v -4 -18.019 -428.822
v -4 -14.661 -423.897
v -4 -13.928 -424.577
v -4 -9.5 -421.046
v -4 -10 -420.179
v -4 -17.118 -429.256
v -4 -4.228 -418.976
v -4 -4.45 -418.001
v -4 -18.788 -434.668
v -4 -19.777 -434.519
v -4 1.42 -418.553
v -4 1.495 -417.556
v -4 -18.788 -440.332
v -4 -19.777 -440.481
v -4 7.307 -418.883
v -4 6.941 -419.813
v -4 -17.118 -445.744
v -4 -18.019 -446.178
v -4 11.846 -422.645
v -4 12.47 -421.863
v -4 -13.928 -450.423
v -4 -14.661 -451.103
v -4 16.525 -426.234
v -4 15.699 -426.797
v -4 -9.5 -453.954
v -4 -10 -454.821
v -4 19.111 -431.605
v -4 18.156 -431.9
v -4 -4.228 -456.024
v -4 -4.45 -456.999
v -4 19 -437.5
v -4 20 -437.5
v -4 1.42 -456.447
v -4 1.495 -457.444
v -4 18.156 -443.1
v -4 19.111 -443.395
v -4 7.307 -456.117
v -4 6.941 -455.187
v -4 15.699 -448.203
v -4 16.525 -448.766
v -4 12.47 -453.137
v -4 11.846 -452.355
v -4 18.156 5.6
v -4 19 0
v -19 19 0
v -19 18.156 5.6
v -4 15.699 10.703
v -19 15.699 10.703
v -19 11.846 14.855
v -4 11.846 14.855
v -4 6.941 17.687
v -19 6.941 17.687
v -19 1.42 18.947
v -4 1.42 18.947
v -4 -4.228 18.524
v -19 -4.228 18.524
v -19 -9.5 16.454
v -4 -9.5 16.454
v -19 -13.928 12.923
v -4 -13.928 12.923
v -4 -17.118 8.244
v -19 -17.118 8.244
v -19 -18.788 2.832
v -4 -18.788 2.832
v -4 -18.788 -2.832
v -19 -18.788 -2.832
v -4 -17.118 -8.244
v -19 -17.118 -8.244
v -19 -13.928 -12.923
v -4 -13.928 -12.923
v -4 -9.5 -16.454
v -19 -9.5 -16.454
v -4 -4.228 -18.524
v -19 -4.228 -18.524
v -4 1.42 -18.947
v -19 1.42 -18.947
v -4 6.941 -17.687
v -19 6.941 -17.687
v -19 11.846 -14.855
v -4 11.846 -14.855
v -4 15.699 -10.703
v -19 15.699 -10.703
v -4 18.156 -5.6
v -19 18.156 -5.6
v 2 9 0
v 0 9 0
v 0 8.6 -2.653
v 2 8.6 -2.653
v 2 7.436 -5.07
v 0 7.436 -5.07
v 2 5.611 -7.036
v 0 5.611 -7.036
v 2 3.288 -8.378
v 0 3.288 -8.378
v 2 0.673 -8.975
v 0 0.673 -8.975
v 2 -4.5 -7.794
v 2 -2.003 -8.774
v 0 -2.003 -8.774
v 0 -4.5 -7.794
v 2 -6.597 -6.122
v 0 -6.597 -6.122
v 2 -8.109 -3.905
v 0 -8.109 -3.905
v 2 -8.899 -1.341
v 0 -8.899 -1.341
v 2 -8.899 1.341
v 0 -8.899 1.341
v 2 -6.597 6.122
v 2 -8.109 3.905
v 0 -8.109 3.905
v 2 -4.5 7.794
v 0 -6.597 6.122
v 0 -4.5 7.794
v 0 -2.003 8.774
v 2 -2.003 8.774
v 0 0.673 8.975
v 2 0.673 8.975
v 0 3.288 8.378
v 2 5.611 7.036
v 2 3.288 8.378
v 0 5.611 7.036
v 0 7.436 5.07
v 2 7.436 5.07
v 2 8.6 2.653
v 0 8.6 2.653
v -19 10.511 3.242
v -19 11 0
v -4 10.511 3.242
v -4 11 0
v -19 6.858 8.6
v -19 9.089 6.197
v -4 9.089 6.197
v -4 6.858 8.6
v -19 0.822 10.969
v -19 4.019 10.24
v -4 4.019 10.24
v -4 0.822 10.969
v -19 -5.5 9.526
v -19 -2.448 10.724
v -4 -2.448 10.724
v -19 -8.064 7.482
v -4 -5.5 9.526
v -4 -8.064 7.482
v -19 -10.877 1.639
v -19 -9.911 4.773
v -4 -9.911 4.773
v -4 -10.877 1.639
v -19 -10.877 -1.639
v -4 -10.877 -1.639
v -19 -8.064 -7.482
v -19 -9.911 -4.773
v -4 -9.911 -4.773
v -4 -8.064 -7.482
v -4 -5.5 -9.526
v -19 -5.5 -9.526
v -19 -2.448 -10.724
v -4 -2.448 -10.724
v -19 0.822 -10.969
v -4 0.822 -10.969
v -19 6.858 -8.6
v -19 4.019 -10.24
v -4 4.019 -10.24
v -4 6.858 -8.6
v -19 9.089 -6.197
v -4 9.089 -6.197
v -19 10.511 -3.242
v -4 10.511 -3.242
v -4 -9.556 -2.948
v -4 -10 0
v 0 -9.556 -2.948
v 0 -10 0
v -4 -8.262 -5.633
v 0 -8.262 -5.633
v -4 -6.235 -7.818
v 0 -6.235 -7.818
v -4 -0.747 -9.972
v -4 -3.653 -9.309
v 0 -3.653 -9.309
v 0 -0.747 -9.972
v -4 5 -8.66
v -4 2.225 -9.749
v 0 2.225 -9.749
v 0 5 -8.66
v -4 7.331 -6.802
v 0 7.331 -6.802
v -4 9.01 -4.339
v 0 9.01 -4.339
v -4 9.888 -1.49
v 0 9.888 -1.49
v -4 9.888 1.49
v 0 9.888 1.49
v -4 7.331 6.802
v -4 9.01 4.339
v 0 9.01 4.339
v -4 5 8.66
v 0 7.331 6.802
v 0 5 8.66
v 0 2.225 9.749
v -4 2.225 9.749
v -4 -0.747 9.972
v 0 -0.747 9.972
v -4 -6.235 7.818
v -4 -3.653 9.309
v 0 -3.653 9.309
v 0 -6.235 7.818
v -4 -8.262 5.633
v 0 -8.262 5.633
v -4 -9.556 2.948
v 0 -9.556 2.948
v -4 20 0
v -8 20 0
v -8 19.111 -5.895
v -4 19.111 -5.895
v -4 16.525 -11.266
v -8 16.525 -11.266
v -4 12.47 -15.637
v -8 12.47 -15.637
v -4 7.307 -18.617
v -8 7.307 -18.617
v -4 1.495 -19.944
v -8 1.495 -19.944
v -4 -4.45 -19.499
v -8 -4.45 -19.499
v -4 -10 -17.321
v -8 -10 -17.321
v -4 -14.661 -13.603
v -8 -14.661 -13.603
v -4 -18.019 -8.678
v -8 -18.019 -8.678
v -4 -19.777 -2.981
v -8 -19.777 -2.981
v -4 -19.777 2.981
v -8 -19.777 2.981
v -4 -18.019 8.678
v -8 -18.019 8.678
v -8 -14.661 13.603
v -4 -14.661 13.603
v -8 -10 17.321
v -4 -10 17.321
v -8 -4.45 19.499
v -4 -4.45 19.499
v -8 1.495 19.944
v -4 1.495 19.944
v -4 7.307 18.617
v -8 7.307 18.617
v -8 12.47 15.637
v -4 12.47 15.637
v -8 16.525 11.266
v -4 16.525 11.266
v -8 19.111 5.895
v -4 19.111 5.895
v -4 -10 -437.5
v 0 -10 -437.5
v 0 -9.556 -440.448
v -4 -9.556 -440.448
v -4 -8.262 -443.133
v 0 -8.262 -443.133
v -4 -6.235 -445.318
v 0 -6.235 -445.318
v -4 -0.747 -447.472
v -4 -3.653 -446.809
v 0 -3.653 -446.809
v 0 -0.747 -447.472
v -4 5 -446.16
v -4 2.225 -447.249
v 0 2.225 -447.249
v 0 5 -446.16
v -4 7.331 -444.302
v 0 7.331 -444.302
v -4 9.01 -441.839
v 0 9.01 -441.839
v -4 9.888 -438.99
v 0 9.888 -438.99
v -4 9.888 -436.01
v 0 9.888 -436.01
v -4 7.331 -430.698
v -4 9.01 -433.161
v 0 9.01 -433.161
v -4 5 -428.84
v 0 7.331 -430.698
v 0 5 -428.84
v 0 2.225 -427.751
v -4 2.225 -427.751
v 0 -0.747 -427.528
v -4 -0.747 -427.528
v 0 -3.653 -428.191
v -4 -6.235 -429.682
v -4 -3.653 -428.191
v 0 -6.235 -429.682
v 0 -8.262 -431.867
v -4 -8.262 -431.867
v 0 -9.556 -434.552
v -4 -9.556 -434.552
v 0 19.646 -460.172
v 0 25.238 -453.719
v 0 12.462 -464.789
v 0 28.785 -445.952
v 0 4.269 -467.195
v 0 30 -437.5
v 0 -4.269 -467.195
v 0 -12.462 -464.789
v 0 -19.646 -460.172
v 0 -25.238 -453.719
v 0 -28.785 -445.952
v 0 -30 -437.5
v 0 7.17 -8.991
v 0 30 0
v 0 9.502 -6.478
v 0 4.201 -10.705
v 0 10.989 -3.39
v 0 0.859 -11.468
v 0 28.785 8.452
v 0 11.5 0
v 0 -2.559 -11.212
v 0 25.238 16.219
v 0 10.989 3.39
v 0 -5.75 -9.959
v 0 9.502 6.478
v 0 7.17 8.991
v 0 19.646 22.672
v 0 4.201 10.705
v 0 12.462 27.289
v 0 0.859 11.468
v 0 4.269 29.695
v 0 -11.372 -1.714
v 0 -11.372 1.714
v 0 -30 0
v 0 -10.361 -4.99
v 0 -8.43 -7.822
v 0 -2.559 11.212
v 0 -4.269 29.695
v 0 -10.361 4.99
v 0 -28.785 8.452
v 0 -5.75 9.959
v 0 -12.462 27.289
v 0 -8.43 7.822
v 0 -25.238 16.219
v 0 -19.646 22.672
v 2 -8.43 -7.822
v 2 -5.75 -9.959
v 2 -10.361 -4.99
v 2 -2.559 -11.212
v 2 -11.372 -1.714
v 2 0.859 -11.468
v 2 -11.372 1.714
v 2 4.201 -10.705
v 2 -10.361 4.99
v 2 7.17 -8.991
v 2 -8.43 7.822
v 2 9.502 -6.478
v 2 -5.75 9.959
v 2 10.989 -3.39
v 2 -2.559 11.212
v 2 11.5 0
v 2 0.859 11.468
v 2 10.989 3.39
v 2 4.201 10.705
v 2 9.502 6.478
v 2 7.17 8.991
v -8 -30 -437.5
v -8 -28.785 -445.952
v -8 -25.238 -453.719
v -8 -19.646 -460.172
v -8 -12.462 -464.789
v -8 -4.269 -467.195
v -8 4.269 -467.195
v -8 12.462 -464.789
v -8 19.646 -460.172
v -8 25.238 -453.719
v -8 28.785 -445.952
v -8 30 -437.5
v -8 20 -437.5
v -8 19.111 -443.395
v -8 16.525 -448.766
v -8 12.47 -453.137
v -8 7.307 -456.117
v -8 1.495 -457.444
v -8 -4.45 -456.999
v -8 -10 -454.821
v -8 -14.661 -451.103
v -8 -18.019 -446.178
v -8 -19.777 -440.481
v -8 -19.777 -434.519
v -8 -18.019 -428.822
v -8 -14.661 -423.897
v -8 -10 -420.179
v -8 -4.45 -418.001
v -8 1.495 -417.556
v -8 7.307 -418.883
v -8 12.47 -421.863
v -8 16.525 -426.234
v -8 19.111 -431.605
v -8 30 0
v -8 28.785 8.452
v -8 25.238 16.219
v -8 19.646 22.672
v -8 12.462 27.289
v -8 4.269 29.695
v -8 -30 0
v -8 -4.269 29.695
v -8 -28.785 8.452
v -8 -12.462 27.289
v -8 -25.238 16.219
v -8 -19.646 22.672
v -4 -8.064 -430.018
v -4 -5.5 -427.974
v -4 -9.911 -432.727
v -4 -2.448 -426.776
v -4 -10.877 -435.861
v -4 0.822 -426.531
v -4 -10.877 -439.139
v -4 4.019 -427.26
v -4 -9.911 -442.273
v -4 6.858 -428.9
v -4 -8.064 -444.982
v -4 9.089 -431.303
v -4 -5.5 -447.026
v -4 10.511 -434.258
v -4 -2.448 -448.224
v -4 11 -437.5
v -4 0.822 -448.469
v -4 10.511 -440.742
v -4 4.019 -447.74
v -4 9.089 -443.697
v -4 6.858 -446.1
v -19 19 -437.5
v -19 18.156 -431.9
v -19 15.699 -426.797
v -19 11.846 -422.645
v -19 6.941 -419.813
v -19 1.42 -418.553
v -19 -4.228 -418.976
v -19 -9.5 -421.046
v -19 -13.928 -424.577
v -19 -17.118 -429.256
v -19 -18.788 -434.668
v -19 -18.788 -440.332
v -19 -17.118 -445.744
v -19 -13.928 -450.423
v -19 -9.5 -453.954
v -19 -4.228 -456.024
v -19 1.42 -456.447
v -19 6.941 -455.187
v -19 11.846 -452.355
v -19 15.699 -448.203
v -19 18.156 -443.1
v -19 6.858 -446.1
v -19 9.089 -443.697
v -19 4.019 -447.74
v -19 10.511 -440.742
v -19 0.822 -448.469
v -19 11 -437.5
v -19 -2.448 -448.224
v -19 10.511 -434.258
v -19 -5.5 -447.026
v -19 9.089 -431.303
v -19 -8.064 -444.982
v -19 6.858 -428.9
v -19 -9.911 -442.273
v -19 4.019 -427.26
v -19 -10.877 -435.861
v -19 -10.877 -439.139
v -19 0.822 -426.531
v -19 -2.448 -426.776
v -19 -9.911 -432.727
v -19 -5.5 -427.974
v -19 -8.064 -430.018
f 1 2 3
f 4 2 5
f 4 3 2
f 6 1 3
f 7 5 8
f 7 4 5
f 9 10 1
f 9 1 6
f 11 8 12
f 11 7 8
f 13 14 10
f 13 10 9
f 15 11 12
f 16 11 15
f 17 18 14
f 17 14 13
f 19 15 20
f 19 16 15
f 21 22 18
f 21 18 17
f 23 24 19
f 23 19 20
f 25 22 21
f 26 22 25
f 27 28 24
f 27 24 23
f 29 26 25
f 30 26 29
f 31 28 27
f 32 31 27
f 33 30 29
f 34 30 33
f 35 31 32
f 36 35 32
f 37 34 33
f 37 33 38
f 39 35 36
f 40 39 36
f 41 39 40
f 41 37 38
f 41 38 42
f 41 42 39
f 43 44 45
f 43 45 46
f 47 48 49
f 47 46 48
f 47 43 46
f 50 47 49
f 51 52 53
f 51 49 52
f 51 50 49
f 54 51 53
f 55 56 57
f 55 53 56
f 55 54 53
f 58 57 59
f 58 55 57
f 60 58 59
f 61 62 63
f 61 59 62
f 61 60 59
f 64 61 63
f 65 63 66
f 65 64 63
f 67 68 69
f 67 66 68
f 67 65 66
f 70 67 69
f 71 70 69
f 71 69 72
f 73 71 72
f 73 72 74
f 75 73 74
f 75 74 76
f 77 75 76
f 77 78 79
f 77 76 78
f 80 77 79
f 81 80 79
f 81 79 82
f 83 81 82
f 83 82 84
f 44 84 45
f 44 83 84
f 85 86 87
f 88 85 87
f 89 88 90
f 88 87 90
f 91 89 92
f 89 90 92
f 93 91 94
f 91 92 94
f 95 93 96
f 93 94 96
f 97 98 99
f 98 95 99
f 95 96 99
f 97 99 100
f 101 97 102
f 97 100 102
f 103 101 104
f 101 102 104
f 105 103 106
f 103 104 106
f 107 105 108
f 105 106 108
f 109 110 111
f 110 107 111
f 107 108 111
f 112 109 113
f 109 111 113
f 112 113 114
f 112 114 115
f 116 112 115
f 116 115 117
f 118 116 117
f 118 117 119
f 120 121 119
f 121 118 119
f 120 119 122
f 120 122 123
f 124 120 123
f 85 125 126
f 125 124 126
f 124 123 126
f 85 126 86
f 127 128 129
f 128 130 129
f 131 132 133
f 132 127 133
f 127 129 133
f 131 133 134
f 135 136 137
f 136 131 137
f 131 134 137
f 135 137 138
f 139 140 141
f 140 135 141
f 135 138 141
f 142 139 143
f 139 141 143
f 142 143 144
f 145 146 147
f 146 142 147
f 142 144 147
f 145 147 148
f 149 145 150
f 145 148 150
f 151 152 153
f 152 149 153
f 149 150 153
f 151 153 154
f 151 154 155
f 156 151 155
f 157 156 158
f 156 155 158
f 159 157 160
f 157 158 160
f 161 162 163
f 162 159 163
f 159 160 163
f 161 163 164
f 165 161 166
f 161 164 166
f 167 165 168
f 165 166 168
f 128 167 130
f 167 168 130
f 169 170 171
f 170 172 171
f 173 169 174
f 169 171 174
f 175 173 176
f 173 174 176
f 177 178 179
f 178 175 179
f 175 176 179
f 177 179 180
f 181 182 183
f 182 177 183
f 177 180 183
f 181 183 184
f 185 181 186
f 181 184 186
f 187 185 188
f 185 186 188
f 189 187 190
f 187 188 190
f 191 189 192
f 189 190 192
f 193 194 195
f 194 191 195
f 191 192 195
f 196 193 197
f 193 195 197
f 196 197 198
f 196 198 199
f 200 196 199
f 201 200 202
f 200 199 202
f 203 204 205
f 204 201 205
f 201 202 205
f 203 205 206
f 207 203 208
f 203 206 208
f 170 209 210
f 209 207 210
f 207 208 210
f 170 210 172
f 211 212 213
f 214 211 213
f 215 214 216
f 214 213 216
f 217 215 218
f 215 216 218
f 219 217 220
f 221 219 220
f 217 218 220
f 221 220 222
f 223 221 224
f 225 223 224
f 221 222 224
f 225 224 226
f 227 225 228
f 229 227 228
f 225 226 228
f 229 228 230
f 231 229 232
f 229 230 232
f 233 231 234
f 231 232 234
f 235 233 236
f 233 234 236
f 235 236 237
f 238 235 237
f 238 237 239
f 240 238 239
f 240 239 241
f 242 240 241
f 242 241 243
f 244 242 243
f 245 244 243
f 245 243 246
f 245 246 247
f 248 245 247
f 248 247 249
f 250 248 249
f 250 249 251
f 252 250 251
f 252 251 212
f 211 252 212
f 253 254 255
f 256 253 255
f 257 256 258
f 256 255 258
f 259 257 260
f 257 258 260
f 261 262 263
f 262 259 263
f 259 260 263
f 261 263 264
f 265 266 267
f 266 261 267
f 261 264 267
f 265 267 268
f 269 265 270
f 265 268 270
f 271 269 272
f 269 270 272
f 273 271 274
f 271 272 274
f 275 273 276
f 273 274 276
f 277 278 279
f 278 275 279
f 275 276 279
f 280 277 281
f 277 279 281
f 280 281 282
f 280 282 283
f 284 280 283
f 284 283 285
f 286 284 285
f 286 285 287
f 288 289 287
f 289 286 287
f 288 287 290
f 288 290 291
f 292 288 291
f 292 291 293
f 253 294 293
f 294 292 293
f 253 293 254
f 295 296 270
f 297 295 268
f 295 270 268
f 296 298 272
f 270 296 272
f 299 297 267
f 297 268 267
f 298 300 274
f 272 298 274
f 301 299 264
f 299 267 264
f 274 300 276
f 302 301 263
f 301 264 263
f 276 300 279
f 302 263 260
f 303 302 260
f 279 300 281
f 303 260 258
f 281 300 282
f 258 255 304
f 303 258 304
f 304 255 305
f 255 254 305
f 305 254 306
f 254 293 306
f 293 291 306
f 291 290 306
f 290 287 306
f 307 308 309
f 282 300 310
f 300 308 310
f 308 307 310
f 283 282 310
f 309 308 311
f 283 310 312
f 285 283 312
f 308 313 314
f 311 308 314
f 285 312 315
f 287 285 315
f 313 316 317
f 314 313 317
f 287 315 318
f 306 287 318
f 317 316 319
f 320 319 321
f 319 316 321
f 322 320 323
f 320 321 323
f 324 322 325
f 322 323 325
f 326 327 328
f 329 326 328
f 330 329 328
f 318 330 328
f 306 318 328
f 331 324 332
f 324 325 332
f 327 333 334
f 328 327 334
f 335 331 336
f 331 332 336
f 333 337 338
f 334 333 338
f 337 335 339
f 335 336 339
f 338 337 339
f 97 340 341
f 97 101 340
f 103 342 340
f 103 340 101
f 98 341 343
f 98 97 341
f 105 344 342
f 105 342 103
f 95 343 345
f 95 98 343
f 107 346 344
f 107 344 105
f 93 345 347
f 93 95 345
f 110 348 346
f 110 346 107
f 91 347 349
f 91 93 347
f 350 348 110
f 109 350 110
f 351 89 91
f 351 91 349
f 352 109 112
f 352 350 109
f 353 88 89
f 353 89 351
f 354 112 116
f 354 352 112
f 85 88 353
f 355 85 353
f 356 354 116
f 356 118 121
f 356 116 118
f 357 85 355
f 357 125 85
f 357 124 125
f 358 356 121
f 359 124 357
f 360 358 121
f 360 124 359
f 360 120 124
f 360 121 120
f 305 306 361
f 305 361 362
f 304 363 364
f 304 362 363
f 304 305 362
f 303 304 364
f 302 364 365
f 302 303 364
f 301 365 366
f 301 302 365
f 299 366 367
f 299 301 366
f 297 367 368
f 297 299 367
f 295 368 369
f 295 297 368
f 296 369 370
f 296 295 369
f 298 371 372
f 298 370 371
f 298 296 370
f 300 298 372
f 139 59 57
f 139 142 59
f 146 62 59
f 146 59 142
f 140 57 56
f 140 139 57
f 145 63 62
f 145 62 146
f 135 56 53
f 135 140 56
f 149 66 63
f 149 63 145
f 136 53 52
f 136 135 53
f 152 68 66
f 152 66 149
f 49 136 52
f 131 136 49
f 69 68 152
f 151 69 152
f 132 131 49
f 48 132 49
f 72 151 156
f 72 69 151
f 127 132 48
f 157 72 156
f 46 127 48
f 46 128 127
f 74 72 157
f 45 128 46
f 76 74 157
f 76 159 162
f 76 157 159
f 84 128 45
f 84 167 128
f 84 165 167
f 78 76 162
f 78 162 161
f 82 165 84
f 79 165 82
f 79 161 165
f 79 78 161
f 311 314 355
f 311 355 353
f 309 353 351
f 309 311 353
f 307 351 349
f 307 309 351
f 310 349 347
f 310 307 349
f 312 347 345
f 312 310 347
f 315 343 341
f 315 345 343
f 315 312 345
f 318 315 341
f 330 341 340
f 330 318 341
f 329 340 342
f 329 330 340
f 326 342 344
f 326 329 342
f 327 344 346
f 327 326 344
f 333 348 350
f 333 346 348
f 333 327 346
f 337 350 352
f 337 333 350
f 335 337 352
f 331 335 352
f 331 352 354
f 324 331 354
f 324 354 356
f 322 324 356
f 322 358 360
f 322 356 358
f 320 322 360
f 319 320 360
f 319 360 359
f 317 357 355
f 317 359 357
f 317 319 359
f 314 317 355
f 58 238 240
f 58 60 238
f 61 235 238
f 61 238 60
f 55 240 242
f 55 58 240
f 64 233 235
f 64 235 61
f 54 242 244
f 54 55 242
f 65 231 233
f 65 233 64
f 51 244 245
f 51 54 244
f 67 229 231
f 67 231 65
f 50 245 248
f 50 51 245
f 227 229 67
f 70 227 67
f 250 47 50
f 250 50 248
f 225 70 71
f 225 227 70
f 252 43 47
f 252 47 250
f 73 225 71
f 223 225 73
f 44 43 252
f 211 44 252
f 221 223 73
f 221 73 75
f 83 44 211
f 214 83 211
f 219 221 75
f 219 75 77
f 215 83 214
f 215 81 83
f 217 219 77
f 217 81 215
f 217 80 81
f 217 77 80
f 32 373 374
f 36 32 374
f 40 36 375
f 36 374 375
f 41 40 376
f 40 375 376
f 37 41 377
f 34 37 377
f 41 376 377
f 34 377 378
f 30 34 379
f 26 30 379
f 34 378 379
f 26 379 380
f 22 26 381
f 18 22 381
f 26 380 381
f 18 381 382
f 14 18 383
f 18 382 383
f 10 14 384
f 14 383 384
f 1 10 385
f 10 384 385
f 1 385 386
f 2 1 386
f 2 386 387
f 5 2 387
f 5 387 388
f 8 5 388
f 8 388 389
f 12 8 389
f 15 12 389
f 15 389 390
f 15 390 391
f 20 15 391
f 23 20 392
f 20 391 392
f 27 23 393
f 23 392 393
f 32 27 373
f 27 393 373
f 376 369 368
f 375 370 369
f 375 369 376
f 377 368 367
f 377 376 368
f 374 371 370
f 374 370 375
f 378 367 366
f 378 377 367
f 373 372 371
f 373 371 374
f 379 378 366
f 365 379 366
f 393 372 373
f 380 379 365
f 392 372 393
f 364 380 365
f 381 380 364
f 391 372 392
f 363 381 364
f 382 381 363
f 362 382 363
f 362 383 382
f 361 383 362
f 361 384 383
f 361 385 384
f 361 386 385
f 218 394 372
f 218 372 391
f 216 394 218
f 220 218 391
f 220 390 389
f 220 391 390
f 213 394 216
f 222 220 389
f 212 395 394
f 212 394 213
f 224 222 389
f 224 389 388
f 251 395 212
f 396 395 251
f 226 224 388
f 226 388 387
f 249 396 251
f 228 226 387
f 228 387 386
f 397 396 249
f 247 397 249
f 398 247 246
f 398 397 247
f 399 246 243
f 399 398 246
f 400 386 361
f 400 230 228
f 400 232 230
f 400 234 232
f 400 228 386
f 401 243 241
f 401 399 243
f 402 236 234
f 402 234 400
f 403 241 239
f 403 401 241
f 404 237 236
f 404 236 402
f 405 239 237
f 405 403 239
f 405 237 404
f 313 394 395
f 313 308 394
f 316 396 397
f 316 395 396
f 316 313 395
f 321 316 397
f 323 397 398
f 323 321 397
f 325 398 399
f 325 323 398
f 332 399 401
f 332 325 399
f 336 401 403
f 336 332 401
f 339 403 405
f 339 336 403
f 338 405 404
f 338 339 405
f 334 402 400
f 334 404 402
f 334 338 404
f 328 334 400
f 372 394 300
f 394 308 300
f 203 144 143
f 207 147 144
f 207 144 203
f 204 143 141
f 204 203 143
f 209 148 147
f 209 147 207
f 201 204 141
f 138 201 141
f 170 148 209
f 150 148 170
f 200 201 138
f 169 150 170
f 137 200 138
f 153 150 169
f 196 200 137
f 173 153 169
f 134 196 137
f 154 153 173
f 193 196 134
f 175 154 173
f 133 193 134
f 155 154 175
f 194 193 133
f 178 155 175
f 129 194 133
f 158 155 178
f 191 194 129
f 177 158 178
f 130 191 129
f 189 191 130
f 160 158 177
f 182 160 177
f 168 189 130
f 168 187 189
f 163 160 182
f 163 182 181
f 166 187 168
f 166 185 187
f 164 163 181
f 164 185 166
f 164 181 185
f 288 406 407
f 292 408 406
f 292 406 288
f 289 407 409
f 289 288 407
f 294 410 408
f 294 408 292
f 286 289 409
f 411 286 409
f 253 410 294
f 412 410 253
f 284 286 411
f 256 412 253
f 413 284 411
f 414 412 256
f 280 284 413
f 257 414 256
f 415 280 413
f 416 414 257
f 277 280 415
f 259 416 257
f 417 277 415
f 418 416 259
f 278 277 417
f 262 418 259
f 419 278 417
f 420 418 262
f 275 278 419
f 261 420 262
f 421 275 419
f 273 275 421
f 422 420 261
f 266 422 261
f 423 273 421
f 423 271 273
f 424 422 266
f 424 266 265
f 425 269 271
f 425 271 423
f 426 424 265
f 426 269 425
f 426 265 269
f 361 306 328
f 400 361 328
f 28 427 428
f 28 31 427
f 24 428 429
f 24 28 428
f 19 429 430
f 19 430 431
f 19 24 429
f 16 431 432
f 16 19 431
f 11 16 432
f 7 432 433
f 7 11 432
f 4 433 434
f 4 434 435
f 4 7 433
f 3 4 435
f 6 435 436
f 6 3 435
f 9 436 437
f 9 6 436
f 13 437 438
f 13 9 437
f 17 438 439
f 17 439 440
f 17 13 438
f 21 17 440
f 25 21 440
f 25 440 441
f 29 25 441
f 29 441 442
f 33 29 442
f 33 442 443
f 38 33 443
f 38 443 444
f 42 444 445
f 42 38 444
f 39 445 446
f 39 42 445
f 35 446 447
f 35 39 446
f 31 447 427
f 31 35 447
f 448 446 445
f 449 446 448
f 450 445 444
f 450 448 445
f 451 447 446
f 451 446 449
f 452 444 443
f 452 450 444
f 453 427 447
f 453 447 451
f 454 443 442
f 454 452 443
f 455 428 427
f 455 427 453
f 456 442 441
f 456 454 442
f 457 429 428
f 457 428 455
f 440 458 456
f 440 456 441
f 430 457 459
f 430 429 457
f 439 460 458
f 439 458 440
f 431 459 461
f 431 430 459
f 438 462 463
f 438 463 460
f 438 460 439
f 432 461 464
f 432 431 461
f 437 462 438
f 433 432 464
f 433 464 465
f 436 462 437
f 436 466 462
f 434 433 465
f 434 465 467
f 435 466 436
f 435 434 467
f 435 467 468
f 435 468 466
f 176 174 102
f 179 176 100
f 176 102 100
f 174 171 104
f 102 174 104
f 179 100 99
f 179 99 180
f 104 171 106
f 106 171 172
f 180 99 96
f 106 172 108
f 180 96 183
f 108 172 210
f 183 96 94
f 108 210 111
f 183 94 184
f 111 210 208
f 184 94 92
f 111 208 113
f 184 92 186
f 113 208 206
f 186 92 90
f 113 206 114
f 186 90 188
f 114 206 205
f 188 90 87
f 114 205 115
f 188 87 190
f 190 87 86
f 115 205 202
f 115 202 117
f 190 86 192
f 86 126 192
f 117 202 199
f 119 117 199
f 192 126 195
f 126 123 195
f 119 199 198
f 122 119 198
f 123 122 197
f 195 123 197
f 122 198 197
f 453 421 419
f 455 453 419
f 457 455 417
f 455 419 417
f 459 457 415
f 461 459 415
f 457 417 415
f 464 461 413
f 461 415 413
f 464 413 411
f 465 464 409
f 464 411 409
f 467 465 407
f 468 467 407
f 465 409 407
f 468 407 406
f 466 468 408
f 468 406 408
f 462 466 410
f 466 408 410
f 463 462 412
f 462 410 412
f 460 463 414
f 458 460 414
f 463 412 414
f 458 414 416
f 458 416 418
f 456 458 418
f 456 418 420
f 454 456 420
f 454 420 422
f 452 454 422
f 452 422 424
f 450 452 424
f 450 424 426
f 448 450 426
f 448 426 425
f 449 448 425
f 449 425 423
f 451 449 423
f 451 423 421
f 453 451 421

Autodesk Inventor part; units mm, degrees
ref_plane "YZ Plane" through (0, 0, 0) normal (1, 0, 0) x (0, 1, 0)
ref_plane "XZ Plane" through (0, 0, 0) normal (0, 1, 0) x (-1, 0, 0)
sketch "Sketch1" plane through (0, 0, 0) normal (0, 1, 0) x (-1, 0, 0)
  circle A0 centre (0, 0) radius 10
  line L0 (0, 0) -> (0, -437.5) construction
  line L1 (-30, 0) -> (-30, -437.5)
  line L2 (30, -437.5) -> (30, 0)
  arc A1 (30, 0) -> (-30, 0) centre (0, 0) ccw
  arc A2 (-30, -437.5) -> (30, -437.5) centre (0, -437.5) ccw
  circle A3 centre (0, -437.5) radius 10
  point P0 (0, -218.75)
  dimension "d0" = 20
  dimension "d1" = 437.5
  dimension "d2" = 20
  dimension "d3" = 30
extrude "Extrusion1" add sketch "Sketch1" along normal blind 8
sketch "Sketch2" plane through (0, 8, 0) normal (0, 1, 0) x (1, 0, 0)
  circle A0 centre (0, 0) radius 20
  circle A1 centre (0, 437.5) radius 10 projected
  circle A2 centre (0, 437.5) radius 10 projected
  circle A3 centre (0, 437.5) radius 20
  circle A4 centre (0, 0) radius 10 projected
  dimension "d6" = 40
extrude "Extrusion2" cut sketch "Sketch2" against normal blind 4
sketch "Sketch3" plane through (0, 0, 0) normal (0, -1, 0) x (1, 0, 0)
  circle A0 centre (0, 0) radius 9 projected
  circle A1 centre (0, 0) radius 11.5
  point P0 (0, 0)
  dimension "d9" = 23
extrude "Extrusion3" add sketch "Sketch3" along normal blind 2
sketch "Sketch4" plane through (0, 4, 0) normal (0, 1, 0) x (1, 0, 0)
  circle A0 centre (0, 0) radius 20 projected
  circle A1 centre (0, 0) radius 10 projected
  circle A2 centre (0, 437.5) radius 20 projected
  circle A3 centre (0, 437.5) radius 10 projected
  circle A4 centre (0, 0) radius 19
  circle A5 centre (0, 0) radius 11
  dimension "d12" = 38
  dimension "d13" = 22
extrude "Extrusion4" add sketch "Sketch4" along normal blind 15 contours A4
ref_plane "Work Plane1" through (0, 0, -218.75) normal (0, 0, 1) x (1, 0, 0)
mirror "Mirror1" about plane through (0, 0, -218.75) normal (0, 0, 1) of "Extrusion4"
move or copy body "Move Body1" bodies to move or copy 1 copy no rotation origin (0, 0, 0) rotation axis (0, 0, 1) rotation angle 90
properties part number "connecting rod" material "Steel, Mild"
